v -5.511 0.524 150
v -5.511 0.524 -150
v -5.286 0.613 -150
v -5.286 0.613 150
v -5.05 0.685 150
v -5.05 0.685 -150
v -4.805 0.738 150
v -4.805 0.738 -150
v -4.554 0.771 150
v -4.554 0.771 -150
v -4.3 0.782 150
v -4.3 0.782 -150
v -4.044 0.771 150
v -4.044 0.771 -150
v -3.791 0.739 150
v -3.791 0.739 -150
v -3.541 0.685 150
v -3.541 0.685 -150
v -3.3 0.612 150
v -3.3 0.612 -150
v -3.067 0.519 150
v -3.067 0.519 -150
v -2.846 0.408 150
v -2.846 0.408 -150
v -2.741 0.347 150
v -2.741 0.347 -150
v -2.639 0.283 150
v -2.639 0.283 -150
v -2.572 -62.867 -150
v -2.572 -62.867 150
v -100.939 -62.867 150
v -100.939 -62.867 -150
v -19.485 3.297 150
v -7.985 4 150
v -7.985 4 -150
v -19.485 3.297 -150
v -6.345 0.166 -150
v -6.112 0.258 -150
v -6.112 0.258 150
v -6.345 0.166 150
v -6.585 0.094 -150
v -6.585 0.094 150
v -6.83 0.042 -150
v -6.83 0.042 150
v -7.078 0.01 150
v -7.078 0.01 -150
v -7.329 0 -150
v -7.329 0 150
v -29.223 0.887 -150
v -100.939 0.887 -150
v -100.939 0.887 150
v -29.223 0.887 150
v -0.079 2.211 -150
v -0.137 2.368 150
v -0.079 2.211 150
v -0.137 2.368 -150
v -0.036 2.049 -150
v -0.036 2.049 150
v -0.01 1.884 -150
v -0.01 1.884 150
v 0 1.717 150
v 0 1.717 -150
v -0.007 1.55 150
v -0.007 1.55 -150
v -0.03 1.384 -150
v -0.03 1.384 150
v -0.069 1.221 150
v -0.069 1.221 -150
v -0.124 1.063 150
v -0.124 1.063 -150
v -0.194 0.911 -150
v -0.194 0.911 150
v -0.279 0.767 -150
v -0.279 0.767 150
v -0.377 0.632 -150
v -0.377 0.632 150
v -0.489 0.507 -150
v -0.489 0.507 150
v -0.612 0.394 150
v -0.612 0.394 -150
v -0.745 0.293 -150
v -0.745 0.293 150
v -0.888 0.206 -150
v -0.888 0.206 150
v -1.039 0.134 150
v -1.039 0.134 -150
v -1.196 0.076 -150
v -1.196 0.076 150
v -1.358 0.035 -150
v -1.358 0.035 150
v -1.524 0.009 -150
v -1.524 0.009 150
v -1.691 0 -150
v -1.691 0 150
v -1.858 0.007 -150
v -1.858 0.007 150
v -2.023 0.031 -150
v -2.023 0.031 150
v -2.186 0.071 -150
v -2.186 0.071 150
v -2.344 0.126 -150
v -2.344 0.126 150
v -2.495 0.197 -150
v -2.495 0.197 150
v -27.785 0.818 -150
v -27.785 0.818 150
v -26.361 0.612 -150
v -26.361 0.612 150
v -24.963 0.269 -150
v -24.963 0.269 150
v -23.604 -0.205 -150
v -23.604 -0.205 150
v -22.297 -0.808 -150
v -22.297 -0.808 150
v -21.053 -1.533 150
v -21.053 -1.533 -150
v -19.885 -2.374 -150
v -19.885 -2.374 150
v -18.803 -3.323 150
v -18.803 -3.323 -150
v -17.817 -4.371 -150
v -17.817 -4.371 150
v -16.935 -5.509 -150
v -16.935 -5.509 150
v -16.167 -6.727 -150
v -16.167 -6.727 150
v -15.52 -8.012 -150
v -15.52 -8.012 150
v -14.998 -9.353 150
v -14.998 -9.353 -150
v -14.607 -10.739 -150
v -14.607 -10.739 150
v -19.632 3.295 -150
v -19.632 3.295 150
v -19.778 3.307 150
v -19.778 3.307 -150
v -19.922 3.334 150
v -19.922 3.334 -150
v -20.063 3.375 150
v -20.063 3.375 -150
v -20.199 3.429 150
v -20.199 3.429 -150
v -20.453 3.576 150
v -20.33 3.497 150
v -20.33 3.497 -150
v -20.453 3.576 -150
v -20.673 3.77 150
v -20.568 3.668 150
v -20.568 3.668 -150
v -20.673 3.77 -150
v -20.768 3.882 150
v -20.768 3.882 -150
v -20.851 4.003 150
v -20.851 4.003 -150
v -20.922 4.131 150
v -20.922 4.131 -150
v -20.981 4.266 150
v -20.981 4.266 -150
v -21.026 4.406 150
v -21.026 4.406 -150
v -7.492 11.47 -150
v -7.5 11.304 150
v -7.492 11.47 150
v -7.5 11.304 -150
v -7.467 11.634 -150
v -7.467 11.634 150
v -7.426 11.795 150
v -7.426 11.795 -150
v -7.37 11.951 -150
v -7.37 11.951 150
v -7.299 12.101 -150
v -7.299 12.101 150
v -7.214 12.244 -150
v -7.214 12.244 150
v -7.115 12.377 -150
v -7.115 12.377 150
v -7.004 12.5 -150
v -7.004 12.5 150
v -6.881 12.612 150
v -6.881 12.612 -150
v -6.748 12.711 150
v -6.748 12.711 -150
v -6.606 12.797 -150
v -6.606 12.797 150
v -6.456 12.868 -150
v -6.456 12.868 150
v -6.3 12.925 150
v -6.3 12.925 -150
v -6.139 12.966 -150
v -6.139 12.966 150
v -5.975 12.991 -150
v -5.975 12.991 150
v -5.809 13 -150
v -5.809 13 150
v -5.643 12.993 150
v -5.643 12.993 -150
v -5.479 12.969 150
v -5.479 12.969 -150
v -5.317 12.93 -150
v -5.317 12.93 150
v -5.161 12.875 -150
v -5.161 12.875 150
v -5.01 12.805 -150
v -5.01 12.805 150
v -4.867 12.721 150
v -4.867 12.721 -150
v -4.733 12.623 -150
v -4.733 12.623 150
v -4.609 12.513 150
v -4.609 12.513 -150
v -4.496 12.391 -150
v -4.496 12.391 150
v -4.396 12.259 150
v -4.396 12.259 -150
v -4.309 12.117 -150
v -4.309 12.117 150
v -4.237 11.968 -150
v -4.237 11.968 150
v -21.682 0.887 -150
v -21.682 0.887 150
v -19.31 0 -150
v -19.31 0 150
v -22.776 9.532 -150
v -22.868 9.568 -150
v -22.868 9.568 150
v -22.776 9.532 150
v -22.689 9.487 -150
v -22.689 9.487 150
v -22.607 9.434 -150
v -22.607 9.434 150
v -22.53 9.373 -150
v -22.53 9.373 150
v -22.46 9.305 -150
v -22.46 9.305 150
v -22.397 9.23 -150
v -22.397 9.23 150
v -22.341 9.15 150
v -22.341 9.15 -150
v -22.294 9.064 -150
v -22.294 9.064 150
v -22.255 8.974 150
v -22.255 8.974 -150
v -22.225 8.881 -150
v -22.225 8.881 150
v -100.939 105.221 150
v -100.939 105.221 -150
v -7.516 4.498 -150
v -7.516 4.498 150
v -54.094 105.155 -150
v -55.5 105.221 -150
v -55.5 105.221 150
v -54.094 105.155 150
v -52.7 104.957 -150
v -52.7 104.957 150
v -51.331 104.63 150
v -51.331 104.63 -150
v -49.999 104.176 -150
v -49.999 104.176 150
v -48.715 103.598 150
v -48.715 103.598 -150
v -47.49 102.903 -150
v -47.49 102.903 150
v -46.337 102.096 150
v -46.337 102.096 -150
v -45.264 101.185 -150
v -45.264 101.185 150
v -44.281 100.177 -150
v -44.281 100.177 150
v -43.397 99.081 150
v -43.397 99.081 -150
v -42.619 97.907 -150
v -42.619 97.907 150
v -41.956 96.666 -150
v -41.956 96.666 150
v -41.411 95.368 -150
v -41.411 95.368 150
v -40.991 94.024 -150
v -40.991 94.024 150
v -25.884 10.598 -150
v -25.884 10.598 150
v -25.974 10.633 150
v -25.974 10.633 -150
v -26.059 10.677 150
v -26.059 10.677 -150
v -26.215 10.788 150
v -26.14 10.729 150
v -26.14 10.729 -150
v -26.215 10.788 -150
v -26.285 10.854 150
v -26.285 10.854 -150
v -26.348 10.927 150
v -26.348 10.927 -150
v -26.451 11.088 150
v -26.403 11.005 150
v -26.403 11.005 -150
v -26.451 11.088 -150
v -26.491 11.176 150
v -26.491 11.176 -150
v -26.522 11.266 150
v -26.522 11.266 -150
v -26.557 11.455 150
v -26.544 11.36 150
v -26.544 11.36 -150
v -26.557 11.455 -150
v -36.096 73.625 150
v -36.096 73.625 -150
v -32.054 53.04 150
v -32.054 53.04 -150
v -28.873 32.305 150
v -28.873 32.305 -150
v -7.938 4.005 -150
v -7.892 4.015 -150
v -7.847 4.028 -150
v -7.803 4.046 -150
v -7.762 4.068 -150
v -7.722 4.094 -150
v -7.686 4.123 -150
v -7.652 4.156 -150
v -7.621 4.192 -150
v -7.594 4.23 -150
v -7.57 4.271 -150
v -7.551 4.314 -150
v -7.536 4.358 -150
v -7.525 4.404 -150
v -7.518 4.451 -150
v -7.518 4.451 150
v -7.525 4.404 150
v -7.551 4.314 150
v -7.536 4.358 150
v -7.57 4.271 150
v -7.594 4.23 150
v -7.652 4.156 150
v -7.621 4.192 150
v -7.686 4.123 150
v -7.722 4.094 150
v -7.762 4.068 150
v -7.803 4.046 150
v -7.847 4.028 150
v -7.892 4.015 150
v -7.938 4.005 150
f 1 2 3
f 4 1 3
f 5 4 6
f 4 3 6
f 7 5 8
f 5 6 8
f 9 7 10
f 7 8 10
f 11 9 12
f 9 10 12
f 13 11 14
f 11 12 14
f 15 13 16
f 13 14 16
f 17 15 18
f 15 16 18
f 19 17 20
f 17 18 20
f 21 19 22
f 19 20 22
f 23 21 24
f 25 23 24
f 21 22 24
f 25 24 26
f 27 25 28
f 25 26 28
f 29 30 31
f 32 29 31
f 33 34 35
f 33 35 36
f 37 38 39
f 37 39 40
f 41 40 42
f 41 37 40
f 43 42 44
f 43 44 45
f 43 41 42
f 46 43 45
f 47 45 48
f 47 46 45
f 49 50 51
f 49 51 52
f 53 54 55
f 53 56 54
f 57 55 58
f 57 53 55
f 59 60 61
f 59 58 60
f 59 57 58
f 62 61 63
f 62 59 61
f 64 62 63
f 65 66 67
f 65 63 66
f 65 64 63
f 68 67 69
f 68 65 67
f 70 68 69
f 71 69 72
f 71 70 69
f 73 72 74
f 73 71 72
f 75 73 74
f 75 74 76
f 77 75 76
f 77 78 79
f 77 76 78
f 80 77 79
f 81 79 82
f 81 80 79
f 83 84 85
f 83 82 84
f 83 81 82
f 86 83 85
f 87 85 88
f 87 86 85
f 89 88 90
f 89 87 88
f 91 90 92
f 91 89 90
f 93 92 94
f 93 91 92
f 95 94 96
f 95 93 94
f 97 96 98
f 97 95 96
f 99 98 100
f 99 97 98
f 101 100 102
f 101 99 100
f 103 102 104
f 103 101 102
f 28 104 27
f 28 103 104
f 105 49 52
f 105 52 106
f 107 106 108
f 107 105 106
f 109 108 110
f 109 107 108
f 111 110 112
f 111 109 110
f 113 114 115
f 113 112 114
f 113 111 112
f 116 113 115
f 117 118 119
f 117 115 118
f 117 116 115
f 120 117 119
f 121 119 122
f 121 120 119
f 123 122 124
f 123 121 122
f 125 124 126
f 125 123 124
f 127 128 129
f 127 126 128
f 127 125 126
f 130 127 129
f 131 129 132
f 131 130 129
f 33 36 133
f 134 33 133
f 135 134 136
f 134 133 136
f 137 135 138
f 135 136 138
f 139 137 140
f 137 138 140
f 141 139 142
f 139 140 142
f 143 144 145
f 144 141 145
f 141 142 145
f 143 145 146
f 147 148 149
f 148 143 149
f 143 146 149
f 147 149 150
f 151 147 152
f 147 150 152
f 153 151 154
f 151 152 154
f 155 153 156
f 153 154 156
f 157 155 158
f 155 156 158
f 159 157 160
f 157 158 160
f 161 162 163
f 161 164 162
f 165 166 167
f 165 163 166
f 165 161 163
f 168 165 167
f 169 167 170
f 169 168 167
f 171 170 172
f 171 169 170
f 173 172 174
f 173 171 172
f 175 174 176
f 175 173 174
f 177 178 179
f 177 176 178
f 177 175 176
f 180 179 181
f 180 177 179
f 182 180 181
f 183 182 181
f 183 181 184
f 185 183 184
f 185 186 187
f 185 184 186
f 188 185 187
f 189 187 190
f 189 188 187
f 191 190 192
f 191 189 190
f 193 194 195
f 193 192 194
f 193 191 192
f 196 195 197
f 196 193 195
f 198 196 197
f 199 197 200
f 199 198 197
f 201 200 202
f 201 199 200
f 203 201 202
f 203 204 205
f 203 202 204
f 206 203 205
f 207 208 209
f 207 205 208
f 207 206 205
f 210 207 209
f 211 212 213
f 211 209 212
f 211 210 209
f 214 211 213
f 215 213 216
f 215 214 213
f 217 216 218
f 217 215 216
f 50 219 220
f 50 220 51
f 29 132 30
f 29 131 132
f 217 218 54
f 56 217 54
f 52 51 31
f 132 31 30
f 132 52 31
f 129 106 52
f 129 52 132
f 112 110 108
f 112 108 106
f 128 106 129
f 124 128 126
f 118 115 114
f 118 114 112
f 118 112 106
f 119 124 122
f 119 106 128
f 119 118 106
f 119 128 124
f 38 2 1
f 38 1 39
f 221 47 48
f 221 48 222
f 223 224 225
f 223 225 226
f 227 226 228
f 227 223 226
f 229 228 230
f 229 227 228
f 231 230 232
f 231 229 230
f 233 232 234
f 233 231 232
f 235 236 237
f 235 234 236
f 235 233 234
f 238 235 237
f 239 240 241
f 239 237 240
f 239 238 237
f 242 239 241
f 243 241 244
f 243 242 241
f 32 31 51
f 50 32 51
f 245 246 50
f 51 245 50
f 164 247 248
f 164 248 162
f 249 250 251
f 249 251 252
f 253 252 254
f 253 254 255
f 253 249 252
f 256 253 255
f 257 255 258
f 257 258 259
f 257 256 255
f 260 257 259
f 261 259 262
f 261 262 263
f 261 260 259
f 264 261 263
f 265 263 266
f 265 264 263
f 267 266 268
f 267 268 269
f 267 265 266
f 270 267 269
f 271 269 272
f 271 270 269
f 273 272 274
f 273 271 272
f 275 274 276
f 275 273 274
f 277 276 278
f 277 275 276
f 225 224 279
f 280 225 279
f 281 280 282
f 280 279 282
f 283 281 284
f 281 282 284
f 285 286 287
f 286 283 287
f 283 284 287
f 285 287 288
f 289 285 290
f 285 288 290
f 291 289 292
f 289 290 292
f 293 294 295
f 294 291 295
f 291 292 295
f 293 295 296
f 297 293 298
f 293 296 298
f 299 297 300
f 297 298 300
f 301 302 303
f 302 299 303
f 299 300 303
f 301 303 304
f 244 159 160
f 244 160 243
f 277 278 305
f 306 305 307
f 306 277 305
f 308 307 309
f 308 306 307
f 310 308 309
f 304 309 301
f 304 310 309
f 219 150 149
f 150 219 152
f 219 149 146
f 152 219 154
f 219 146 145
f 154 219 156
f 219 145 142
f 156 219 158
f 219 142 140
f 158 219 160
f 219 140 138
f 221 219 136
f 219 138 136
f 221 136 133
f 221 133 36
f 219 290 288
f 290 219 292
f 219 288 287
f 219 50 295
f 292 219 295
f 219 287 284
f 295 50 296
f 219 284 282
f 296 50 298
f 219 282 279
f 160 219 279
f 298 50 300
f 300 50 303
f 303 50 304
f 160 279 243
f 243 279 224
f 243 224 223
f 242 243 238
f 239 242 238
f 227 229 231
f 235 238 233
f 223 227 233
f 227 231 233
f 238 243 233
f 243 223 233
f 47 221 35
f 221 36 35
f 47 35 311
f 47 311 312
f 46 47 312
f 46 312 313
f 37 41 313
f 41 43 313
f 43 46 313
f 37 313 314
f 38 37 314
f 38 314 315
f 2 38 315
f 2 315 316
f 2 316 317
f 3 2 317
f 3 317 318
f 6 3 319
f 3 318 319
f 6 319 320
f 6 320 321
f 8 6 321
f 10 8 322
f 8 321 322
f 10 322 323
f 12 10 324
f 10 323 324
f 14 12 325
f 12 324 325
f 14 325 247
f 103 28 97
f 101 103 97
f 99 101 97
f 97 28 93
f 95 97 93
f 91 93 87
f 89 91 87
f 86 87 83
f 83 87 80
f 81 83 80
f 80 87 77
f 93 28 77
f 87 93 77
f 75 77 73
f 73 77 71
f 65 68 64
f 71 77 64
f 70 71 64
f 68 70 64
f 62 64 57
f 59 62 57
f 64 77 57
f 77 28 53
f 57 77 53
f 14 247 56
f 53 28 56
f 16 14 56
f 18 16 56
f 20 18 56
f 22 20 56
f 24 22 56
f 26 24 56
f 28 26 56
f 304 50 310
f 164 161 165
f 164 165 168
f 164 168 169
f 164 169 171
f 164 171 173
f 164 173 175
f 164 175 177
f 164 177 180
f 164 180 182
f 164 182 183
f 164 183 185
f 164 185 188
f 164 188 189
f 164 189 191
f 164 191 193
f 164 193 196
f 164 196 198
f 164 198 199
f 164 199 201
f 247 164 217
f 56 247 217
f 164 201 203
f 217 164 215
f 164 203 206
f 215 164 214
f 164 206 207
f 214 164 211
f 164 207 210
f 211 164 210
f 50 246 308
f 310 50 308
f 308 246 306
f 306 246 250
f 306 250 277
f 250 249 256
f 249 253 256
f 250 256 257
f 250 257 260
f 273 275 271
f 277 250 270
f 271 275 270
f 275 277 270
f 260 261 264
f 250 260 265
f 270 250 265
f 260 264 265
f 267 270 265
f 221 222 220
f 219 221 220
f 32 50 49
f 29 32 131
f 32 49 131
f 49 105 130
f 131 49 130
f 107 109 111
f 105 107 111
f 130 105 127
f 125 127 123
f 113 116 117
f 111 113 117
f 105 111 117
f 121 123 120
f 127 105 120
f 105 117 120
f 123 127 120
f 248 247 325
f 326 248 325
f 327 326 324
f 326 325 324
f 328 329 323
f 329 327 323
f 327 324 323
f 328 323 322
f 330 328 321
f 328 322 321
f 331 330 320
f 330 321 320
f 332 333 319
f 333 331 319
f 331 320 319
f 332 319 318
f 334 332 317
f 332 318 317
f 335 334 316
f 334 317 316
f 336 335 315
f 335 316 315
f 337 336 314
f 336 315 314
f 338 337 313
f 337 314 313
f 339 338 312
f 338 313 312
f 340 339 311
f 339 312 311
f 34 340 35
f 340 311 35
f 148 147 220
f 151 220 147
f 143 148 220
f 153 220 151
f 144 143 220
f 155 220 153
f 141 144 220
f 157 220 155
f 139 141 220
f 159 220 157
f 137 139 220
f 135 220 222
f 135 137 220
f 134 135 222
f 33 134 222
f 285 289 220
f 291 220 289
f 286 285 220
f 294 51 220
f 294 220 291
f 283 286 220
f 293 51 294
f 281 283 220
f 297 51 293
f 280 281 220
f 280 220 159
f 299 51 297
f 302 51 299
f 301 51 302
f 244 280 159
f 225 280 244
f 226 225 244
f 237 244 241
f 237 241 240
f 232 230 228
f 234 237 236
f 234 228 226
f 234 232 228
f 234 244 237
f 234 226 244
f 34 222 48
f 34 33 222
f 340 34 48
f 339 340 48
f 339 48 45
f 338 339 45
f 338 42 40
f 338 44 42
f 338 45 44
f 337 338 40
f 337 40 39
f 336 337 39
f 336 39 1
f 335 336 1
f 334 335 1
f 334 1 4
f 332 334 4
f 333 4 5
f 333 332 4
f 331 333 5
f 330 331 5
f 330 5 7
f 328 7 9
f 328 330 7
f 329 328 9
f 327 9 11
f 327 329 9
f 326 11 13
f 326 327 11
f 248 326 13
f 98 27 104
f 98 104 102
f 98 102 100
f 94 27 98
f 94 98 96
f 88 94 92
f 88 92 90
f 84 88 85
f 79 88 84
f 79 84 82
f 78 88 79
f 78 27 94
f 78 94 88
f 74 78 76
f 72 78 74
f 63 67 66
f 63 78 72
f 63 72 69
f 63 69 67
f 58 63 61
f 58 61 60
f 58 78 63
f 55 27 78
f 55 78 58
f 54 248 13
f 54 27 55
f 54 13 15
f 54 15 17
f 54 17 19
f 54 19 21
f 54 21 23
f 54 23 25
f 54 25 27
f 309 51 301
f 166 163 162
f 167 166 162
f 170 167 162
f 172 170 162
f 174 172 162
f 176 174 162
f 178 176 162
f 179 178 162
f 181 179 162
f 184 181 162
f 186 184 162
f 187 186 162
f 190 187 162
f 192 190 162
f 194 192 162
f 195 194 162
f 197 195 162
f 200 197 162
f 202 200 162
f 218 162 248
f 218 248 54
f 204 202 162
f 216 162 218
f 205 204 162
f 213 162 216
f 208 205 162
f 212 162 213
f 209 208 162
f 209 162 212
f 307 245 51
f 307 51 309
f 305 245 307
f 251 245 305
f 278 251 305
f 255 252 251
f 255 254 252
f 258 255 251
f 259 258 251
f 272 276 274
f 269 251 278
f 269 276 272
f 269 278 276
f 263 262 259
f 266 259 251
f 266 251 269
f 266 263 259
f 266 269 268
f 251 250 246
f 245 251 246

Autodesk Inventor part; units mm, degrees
ref_plane "YZ Plane" through (0, 0, 0) normal (1, 0, 0) x (0, 1, 0)
ref_plane "XZ Plane" through (0, 0, 0) normal (0, 1, 0) x (-1, 0, 0)
ref_plane "XY Plane" through (0, 0, 0) normal (0, 0, 1) x (1, 0, 0)
sketch "草圖1" plane through (0, 0, 0) normal (0, 0, 1) x (1, 0, 0)
  line L0 (0, 0) -> (-9.6483, 0) construction
  line L1 (0, 0) -> (0, 8.3837) construction
  line L2 (-7.5155, 4.4979) -> (-7.5, 11.3039)
  arc A0 (-4.2366, 11.9677) -> (-7.5, 11.3039) centre (-5.8, 11.3) ccw
  line L3 (-4.2366, 11.9677) -> (-0.1366, 2.3677)
  arc A1 (-3.1931, 0.8871) -> (-0.1366, 2.3677) centre (-1.7, 1.7) ccw
  line L4 (-3.1931, 0.8871) -> (-4.6931, 0.8871)
  line L5 (-4.6931, 0.8871) -> (-6.6931, 0)
  line L6 (-6.6931, 0) -> (-19.3096, 0)
  line L7 (-19.3096, 0) -> (-21.6815, 0.8871)
  line L8 (-21.6815, 0.8871) -> (-100.9388, 0.8871)
  line L9 (-21.0255, 4.4056) -> (-22.2246, 8.8809)
  line L10 (-22.8675, 9.5685) -> (-25.8843, 10.598)
  arc A2 (-22.2246, 8.8809) -> (-22.8675, 9.5685) centre (-23.1905, 8.6221) ccw
  line L11 (-13.2, 16.4786) -> (-10.2, 16.4786) construction
  line L12 (-10.2, 16.4786) -> (-10.2, 4.7787) construction
  line L13 (-10.2, 4.7787) -> (-13.2, 4.7787) construction
  line L14 (-13.2, 4.7787) -> (-13.2, 16.4786) construction
  arc A3 (-26.5573, 11.4548) -> (-44.0636, 105.2211) centre (-528.3565, -33.7147) ccw
  arc A4 (-26.5573, 11.4548) -> (-25.8843, 10.598) centre (-25.5613, 11.5444) ccw
  line L15 (-44.0636, 105.2211) -> (-100.9388, 105.2211)
  line L16 (-100.9388, 105.2211) -> (-100.9388, 0.8871)
  line L17 (-9.2215, 13) -> (-2.2458, 13) construction
  line L18 (-7.985, 4) -> (-19.485, 3.2966)
  arc A5 (-7.985, 4) -> (-7.5155, 4.4979) centre (-8.0155, 4.4991) ccw
  arc A6 (-21.0255, 4.4056) -> (-19.485, 3.2966) centre (-19.5766, 4.7938) ccw
  point P0 (-26.4995, 10.808)
  point P1 (-11.7, 4.7787)
  point P2 (-20.814, 3.6164)
  dimension "d0" = 13
  dimension "d4" = 1.7
  dimension "d5" = 1.7
  dimension "d9" = 1
  dimension "d13" = 3
  dimension "d14" = 10
  dimension "d25" = 1
  dimension "d28" = 2
  dimension "d29" = 1.5
  dimension "d31" = 7.5
  dimension "d35" = 23.257
  dimension "d37" = 3.5
  dimension "d38" = 0.5
  dimension "d39" = 11.5
  dimension "d40" = 9
  dimension "d41" = 1.5
  dimension "d53" = 503.8281
  dimension "d55" = 101.5
  dimension "d56" = 0.8871
  dimension "d57" = 12.6165
  dimension "d58" = 79.2574
  dimension "d59" = 20.507
  dimension "d60" = 104.3339
  dimension "d61" = 123.844
  dimension "d62" = 5.5417
  dimension "d63" = 8.6034
  dimension "d64" = 34.6018
extrude "擠出1" add sketch "草圖1" along normal mid plane 300
fillet "圓角2" radius 3 3 edges at (-3.1931, 0.8871, 0) (-6.6931, 0, 0) (-4.6931, 0.8871, 0)
sketch "草圖4" plane through (0, 0, 0) normal (0, 0, 1) x (1, 0, 0)
  line L0 (-100.9388, 0.8871) -> (-29.2228, 0.8871)
  arc A0 (-14.6072, -10.7386) -> (-29.2228, 0.8871) centre (-29.2228, -14.1129) ccw
  line L1 (-14.6072, -10.7386) -> (-2.5725, -62.867)
  line L2 (-100.9388, 0.8871) -> (-21.6815, 0.8871) projected
  line L3 (-2.5725, -62.867) -> (-100.9388, -62.867)
  line L4 (-100.9388, -62.867) -> (-100.9388, 0.8871)
  point P0 (0, 0)
  dimension "d45" = 103
  dimension "d46" = 0
  dimension "d48" = 15
  dimension "d67" = 63.7541
  dimension "d68" = 71.716
extrude "擠出2" add sketch "草圖4" along normal mid plane 300 separate body
fillet "圓角3" radius 15 1 edges at (-44.0636, 105.2211, 0)
properties part number "0 零件"
